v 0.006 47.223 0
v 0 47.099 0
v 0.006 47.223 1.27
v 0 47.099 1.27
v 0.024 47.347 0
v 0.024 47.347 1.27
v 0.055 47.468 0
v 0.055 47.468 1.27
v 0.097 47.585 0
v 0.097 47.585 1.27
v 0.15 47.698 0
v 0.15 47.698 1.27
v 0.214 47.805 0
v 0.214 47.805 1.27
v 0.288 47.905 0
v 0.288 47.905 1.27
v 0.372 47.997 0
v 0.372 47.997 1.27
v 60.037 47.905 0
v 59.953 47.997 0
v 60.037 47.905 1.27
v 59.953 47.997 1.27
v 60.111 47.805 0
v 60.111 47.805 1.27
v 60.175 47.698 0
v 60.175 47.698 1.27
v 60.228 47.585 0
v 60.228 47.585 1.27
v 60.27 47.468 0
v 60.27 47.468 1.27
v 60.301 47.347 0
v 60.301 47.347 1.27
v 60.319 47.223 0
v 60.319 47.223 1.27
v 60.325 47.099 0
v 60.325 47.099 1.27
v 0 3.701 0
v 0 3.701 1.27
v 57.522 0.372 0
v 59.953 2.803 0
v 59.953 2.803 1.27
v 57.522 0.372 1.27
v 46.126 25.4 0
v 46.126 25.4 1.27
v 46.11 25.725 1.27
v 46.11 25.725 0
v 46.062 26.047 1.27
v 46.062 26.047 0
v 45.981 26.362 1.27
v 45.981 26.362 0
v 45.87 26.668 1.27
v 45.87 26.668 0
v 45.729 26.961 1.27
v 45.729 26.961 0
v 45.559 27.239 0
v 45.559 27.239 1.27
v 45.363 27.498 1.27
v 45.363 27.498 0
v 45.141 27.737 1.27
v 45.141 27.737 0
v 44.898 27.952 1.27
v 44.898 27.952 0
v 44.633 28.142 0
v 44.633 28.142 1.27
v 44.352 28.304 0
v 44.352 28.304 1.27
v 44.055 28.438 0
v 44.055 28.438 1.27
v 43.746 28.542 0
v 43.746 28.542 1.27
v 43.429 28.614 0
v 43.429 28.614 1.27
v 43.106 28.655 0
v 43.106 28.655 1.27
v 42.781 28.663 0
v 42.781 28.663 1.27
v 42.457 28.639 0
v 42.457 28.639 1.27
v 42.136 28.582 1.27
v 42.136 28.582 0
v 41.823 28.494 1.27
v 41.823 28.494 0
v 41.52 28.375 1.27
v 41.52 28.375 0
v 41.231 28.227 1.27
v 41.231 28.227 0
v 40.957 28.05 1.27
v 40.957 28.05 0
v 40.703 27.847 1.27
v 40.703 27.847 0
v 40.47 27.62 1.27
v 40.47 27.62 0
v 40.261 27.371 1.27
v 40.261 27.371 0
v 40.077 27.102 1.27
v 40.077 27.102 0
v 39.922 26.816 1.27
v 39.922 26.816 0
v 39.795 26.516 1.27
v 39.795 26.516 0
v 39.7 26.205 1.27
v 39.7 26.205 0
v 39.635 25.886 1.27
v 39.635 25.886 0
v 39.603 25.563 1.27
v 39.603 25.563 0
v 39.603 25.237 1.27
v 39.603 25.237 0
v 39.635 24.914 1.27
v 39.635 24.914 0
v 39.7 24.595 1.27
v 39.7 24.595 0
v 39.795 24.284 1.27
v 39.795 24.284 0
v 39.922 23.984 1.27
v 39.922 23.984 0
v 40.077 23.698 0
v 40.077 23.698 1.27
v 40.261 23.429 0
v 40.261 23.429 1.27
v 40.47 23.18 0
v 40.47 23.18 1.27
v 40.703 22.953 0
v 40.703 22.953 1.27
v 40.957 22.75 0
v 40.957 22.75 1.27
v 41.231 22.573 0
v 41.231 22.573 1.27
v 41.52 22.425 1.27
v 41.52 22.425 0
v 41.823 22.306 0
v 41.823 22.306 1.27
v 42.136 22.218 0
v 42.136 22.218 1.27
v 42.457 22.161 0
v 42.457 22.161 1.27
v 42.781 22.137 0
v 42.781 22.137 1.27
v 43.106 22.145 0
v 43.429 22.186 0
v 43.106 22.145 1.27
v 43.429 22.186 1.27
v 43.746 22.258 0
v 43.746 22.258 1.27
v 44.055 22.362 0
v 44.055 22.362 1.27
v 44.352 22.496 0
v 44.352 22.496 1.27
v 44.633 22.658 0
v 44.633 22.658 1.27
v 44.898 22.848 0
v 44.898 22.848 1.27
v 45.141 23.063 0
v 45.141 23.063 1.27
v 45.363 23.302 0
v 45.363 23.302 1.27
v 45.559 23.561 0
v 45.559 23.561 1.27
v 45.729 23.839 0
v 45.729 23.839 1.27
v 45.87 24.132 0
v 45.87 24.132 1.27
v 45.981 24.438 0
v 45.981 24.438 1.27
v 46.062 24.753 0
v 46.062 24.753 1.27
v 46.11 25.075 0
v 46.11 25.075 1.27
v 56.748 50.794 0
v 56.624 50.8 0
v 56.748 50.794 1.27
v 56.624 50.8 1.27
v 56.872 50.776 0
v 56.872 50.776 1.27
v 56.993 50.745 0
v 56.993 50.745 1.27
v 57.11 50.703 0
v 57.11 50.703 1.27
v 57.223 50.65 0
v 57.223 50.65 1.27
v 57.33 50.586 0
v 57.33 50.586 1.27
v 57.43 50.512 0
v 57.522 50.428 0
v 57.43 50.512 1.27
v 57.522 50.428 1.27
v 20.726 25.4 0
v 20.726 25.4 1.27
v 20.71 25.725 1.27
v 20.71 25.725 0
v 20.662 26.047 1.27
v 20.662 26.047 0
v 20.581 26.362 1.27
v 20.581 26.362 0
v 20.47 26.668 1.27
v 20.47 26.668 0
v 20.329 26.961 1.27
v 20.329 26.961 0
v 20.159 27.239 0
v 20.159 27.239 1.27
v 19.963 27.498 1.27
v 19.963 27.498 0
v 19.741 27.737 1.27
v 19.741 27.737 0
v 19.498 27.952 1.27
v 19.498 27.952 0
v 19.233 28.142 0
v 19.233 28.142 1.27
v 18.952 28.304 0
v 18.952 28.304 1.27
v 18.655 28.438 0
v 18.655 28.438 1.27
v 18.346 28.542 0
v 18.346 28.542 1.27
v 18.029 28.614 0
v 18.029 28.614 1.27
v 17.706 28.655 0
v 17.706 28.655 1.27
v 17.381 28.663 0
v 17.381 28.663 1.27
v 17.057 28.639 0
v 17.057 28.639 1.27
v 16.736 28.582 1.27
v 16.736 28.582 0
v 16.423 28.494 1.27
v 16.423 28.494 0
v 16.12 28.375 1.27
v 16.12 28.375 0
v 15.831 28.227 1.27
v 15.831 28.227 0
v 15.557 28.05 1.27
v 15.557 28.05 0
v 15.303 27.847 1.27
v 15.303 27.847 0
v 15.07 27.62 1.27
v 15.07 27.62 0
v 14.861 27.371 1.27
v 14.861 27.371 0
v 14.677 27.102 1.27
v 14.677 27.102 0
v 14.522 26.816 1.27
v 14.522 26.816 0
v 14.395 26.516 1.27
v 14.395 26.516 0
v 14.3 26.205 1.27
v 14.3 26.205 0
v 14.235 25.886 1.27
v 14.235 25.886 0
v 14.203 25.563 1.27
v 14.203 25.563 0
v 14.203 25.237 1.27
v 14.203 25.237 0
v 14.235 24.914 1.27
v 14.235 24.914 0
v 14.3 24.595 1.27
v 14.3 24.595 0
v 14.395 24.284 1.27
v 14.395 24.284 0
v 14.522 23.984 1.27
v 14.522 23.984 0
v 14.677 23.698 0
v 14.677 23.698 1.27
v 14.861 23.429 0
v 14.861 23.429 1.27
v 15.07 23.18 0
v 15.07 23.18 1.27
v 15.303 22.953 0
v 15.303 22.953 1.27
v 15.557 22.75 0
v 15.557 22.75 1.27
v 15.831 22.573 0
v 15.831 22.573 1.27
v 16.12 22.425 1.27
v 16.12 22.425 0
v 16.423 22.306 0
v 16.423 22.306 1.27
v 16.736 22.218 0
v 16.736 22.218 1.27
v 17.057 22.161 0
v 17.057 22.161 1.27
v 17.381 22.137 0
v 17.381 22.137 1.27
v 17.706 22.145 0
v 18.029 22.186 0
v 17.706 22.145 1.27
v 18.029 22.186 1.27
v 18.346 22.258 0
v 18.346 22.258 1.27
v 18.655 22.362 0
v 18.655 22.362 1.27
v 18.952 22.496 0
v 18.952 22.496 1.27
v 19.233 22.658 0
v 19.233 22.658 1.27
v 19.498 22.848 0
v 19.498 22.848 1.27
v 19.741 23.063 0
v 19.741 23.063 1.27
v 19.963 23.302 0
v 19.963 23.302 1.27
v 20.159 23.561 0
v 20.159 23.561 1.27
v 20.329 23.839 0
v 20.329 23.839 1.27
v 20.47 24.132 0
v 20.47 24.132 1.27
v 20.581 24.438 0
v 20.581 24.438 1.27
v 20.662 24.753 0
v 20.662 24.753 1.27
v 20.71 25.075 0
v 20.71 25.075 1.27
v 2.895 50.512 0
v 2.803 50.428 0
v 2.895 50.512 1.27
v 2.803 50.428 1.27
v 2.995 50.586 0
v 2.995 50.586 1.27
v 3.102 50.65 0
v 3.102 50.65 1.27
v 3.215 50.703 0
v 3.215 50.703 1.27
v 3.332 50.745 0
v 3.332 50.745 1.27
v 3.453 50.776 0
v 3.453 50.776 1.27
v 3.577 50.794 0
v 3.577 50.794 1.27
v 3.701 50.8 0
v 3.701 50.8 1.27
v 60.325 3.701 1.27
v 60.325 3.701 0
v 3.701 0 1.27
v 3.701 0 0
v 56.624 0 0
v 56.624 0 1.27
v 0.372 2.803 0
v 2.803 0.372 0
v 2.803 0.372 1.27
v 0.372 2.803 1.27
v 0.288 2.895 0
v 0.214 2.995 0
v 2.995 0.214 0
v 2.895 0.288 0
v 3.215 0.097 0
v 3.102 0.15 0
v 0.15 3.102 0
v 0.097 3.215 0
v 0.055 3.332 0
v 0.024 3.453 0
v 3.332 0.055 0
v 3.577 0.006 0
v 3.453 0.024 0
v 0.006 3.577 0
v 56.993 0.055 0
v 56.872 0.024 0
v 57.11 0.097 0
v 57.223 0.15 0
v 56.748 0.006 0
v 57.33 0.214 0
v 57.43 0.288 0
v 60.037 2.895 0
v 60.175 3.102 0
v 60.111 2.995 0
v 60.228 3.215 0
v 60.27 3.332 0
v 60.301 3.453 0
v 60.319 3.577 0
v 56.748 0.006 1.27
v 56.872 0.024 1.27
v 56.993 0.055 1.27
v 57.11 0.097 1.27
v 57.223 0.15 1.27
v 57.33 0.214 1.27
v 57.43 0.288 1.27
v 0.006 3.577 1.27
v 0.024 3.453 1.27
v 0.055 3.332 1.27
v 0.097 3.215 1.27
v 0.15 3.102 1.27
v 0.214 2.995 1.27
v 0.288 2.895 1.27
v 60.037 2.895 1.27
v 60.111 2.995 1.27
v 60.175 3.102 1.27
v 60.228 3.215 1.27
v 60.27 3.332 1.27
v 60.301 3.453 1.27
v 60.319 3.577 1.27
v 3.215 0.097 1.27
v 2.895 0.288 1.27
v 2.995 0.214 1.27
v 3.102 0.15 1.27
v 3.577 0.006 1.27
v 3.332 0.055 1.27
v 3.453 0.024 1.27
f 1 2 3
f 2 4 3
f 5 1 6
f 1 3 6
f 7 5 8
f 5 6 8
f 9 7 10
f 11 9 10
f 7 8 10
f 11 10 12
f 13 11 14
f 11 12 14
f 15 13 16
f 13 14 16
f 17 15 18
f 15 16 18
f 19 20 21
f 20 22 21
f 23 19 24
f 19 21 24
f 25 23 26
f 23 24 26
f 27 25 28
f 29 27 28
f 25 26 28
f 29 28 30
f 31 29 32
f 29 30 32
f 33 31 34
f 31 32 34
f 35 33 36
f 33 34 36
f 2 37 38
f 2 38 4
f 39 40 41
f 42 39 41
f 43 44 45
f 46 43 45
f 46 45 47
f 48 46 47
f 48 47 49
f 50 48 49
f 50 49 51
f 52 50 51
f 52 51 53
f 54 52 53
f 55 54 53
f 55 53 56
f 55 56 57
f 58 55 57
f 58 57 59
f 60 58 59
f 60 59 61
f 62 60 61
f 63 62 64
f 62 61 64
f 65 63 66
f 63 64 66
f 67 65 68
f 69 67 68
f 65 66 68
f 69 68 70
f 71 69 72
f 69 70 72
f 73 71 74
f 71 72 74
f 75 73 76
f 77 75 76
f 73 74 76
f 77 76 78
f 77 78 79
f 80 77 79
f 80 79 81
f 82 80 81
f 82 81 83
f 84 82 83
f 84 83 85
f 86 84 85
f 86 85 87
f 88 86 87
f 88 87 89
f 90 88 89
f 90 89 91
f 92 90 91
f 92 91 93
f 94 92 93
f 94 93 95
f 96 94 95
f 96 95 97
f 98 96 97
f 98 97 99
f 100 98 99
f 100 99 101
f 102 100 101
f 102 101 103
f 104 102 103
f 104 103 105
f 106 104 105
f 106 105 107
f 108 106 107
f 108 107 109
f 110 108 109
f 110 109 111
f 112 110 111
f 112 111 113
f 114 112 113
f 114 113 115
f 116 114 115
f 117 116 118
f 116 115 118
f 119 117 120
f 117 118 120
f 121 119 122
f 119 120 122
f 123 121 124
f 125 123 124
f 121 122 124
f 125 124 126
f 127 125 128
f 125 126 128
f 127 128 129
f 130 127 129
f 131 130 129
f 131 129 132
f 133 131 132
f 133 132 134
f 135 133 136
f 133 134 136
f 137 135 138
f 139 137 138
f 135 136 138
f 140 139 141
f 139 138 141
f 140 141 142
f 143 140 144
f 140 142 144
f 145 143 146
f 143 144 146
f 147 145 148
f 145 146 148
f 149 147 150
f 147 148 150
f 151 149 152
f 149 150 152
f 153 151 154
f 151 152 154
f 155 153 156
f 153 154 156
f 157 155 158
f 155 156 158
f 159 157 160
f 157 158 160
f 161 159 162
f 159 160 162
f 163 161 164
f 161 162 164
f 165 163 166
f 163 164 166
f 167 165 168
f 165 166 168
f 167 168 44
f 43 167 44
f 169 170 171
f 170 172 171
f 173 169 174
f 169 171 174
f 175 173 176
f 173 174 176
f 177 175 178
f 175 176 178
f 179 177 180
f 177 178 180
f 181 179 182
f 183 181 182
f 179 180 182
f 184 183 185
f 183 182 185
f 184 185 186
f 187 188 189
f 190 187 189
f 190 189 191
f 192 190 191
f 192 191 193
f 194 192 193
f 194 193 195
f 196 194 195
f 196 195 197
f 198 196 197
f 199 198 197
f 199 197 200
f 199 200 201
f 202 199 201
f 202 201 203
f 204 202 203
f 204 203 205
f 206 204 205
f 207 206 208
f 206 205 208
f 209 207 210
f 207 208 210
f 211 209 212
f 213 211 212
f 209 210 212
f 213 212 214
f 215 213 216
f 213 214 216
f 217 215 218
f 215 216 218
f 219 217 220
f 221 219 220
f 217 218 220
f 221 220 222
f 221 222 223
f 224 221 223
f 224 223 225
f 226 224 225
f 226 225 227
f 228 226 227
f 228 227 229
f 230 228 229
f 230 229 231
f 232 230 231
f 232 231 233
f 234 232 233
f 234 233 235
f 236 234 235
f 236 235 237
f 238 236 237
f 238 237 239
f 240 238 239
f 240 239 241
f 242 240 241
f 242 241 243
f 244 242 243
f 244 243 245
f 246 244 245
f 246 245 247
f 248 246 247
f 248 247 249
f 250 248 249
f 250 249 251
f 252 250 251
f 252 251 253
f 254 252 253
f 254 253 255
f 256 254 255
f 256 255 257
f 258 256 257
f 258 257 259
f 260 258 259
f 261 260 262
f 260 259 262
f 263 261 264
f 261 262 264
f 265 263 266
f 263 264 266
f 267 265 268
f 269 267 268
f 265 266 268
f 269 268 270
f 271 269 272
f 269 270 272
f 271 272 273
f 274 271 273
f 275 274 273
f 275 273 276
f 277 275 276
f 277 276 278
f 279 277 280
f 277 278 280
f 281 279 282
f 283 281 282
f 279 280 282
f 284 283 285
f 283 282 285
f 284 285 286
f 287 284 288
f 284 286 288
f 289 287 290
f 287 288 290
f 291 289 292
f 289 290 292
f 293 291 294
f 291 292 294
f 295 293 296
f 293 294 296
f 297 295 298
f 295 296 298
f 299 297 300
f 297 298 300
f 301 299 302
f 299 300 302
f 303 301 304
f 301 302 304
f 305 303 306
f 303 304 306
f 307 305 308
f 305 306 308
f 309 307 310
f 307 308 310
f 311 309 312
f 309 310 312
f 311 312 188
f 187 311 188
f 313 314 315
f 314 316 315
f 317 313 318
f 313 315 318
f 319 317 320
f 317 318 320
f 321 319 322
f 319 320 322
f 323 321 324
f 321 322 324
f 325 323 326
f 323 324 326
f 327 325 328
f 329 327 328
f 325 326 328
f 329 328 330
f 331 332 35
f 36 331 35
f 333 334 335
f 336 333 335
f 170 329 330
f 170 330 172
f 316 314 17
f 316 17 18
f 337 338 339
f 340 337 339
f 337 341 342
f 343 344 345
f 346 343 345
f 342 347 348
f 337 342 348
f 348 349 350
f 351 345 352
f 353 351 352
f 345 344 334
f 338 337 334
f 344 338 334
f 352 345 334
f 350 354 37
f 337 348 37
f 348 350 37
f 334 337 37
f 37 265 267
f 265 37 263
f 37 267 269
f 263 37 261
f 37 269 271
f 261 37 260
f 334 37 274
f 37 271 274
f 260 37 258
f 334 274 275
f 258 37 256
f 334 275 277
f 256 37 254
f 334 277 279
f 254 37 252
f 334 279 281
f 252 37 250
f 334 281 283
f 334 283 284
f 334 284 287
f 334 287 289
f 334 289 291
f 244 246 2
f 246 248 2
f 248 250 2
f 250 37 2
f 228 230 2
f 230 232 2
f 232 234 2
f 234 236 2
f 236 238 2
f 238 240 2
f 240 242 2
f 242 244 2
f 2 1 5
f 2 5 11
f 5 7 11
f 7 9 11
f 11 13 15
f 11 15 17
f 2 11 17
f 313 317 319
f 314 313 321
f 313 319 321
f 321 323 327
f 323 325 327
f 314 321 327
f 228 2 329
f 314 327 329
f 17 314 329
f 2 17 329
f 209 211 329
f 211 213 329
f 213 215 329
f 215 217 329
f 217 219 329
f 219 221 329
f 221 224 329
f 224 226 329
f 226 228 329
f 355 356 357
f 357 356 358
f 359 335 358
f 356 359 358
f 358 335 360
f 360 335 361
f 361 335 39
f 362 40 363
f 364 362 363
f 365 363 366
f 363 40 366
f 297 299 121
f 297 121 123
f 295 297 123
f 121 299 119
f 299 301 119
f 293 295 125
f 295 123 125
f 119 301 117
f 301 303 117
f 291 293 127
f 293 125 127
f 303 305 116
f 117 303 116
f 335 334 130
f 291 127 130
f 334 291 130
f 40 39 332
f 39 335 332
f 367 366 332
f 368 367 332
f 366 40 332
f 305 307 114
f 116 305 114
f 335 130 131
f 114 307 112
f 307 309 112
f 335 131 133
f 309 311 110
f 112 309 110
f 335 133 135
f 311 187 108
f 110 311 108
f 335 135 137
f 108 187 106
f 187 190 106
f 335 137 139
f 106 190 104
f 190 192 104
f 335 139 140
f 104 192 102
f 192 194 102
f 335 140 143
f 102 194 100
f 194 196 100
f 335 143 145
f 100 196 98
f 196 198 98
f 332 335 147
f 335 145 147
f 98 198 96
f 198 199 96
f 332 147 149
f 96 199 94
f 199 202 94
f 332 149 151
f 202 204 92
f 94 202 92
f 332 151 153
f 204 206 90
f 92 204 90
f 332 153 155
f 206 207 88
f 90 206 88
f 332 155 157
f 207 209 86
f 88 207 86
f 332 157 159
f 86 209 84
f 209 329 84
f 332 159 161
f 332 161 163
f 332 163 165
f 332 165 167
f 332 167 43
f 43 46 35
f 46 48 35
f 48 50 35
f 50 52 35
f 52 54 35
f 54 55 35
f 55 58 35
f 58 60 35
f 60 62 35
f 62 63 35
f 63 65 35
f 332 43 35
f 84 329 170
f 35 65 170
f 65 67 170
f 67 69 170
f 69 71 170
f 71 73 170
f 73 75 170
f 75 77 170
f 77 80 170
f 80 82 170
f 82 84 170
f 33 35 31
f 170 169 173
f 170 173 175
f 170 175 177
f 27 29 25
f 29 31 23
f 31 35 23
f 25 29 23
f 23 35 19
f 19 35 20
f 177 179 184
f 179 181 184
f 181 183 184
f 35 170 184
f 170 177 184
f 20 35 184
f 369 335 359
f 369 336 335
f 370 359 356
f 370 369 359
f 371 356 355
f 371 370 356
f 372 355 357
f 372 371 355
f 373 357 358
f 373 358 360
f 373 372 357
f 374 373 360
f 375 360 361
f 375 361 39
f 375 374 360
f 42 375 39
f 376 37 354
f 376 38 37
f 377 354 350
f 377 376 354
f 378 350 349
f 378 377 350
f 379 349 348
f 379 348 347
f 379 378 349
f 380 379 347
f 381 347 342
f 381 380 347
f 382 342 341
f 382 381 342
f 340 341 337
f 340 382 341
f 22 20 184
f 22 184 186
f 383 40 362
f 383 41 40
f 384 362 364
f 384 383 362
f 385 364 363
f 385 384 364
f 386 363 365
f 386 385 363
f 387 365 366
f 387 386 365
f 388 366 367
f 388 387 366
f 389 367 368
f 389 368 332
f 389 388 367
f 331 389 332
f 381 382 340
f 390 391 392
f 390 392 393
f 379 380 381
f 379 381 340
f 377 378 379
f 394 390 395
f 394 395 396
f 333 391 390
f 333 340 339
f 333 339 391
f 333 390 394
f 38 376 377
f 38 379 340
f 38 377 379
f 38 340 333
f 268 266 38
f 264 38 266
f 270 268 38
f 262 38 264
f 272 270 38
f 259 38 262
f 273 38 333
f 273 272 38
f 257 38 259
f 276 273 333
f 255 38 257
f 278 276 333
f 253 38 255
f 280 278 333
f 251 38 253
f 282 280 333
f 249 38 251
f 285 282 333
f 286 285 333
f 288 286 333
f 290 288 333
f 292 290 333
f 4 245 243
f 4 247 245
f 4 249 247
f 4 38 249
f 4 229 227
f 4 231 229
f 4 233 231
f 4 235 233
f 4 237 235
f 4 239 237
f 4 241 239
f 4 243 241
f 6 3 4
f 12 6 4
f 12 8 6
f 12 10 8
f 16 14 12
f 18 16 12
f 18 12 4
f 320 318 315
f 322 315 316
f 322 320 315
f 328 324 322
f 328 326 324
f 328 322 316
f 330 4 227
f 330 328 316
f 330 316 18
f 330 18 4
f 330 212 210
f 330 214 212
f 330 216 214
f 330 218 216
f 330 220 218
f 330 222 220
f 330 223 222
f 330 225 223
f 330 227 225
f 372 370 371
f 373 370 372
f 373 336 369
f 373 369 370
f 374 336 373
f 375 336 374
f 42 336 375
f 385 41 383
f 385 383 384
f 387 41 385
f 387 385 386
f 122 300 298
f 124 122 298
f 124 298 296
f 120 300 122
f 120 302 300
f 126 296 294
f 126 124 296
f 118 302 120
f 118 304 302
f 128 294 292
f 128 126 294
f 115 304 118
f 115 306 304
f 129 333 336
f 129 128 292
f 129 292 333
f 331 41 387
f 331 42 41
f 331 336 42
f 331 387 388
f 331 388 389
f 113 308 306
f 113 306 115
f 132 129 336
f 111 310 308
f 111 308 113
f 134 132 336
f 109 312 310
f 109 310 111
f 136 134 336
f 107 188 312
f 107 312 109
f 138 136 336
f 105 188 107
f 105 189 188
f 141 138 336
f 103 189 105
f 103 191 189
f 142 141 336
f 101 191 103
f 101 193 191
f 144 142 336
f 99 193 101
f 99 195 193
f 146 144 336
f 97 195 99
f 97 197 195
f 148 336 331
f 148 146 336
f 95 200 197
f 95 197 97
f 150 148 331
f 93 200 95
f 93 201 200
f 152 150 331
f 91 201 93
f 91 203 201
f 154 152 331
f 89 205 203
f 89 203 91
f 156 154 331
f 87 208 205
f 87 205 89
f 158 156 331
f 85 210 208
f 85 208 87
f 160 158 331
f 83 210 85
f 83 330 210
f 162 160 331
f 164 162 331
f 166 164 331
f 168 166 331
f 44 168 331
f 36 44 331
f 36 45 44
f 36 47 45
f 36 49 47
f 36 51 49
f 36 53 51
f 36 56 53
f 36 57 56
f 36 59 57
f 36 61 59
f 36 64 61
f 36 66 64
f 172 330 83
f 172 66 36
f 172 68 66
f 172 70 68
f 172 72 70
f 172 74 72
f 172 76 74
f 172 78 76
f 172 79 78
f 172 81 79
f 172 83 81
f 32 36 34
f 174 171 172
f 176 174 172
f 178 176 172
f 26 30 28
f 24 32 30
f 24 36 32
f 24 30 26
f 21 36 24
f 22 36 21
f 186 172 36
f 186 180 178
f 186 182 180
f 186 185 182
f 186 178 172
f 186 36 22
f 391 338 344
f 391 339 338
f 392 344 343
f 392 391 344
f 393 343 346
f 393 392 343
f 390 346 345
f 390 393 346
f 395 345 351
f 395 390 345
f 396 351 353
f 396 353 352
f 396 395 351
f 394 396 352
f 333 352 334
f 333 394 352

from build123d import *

# Parameters (mm, degrees)
SKETCH1_W           = 60.325
SKETCH1_H           = 50.8
BOSS_EXTRUDE1_DEPTH = 1.27
SKETCH3_R           = 3.2639
CUT_EXTRUDE1_DEPTH  = 2.27
CHAMFER1_SIZE       = 3.175
FILLET1_R           = 1.27


with BuildPart() as part:
    # Sketch1 → Boss-Extrude1 (new body)
    with BuildSketch(Plane.XY):
        with Locations((30.1625, 25.4)):
            Rectangle(SKETCH1_W, SKETCH1_H)
    extrude(amount=BOSS_EXTRUDE1_DEPTH)

    # Sketch3 → Cut-Extrude1 (cut, through all)
    with BuildSketch(Plane.XY.offset(1.27)):
        with Locations((42.8625, 25.4)):
            Circle(SKETCH3_R)
        with Locations((17.4625, 25.4)):
            Circle(SKETCH3_R)
    extrude(amount=-CUT_EXTRUDE1_DEPTH, mode=Mode.SUBTRACT)

    # Chamfer1
    chamfer1_edges = [part.edges().sort_by_distance(p)[0] for p in [
        (0, 0, 0.635),
        (0, 50.8, 0.635),
        (60.325, 50.8, 0.635),
        (60.325, 0, 0.635),
    ]]
    chamfer(chamfer1_edges, length=CHAMFER1_SIZE)

    # Fillet1
    fillet1_edges = [part.edges().sort_by_distance(p)[0] for p in [
        (57.15, 0, 0.635),
        (3.175, 0, 0.635),
        (0, 47.625, 0.635),
        (0, 3.175, 0.635),
        (57.15, 50.8, 0.635),
        (3.175, 50.8, 0.635),
        (60.325, 3.175, 0.635),
        (60.325, 47.625, 0.635),
    ]]
    fillet(fillet1_edges, radius=FILLET1_R)


solid = part.part
